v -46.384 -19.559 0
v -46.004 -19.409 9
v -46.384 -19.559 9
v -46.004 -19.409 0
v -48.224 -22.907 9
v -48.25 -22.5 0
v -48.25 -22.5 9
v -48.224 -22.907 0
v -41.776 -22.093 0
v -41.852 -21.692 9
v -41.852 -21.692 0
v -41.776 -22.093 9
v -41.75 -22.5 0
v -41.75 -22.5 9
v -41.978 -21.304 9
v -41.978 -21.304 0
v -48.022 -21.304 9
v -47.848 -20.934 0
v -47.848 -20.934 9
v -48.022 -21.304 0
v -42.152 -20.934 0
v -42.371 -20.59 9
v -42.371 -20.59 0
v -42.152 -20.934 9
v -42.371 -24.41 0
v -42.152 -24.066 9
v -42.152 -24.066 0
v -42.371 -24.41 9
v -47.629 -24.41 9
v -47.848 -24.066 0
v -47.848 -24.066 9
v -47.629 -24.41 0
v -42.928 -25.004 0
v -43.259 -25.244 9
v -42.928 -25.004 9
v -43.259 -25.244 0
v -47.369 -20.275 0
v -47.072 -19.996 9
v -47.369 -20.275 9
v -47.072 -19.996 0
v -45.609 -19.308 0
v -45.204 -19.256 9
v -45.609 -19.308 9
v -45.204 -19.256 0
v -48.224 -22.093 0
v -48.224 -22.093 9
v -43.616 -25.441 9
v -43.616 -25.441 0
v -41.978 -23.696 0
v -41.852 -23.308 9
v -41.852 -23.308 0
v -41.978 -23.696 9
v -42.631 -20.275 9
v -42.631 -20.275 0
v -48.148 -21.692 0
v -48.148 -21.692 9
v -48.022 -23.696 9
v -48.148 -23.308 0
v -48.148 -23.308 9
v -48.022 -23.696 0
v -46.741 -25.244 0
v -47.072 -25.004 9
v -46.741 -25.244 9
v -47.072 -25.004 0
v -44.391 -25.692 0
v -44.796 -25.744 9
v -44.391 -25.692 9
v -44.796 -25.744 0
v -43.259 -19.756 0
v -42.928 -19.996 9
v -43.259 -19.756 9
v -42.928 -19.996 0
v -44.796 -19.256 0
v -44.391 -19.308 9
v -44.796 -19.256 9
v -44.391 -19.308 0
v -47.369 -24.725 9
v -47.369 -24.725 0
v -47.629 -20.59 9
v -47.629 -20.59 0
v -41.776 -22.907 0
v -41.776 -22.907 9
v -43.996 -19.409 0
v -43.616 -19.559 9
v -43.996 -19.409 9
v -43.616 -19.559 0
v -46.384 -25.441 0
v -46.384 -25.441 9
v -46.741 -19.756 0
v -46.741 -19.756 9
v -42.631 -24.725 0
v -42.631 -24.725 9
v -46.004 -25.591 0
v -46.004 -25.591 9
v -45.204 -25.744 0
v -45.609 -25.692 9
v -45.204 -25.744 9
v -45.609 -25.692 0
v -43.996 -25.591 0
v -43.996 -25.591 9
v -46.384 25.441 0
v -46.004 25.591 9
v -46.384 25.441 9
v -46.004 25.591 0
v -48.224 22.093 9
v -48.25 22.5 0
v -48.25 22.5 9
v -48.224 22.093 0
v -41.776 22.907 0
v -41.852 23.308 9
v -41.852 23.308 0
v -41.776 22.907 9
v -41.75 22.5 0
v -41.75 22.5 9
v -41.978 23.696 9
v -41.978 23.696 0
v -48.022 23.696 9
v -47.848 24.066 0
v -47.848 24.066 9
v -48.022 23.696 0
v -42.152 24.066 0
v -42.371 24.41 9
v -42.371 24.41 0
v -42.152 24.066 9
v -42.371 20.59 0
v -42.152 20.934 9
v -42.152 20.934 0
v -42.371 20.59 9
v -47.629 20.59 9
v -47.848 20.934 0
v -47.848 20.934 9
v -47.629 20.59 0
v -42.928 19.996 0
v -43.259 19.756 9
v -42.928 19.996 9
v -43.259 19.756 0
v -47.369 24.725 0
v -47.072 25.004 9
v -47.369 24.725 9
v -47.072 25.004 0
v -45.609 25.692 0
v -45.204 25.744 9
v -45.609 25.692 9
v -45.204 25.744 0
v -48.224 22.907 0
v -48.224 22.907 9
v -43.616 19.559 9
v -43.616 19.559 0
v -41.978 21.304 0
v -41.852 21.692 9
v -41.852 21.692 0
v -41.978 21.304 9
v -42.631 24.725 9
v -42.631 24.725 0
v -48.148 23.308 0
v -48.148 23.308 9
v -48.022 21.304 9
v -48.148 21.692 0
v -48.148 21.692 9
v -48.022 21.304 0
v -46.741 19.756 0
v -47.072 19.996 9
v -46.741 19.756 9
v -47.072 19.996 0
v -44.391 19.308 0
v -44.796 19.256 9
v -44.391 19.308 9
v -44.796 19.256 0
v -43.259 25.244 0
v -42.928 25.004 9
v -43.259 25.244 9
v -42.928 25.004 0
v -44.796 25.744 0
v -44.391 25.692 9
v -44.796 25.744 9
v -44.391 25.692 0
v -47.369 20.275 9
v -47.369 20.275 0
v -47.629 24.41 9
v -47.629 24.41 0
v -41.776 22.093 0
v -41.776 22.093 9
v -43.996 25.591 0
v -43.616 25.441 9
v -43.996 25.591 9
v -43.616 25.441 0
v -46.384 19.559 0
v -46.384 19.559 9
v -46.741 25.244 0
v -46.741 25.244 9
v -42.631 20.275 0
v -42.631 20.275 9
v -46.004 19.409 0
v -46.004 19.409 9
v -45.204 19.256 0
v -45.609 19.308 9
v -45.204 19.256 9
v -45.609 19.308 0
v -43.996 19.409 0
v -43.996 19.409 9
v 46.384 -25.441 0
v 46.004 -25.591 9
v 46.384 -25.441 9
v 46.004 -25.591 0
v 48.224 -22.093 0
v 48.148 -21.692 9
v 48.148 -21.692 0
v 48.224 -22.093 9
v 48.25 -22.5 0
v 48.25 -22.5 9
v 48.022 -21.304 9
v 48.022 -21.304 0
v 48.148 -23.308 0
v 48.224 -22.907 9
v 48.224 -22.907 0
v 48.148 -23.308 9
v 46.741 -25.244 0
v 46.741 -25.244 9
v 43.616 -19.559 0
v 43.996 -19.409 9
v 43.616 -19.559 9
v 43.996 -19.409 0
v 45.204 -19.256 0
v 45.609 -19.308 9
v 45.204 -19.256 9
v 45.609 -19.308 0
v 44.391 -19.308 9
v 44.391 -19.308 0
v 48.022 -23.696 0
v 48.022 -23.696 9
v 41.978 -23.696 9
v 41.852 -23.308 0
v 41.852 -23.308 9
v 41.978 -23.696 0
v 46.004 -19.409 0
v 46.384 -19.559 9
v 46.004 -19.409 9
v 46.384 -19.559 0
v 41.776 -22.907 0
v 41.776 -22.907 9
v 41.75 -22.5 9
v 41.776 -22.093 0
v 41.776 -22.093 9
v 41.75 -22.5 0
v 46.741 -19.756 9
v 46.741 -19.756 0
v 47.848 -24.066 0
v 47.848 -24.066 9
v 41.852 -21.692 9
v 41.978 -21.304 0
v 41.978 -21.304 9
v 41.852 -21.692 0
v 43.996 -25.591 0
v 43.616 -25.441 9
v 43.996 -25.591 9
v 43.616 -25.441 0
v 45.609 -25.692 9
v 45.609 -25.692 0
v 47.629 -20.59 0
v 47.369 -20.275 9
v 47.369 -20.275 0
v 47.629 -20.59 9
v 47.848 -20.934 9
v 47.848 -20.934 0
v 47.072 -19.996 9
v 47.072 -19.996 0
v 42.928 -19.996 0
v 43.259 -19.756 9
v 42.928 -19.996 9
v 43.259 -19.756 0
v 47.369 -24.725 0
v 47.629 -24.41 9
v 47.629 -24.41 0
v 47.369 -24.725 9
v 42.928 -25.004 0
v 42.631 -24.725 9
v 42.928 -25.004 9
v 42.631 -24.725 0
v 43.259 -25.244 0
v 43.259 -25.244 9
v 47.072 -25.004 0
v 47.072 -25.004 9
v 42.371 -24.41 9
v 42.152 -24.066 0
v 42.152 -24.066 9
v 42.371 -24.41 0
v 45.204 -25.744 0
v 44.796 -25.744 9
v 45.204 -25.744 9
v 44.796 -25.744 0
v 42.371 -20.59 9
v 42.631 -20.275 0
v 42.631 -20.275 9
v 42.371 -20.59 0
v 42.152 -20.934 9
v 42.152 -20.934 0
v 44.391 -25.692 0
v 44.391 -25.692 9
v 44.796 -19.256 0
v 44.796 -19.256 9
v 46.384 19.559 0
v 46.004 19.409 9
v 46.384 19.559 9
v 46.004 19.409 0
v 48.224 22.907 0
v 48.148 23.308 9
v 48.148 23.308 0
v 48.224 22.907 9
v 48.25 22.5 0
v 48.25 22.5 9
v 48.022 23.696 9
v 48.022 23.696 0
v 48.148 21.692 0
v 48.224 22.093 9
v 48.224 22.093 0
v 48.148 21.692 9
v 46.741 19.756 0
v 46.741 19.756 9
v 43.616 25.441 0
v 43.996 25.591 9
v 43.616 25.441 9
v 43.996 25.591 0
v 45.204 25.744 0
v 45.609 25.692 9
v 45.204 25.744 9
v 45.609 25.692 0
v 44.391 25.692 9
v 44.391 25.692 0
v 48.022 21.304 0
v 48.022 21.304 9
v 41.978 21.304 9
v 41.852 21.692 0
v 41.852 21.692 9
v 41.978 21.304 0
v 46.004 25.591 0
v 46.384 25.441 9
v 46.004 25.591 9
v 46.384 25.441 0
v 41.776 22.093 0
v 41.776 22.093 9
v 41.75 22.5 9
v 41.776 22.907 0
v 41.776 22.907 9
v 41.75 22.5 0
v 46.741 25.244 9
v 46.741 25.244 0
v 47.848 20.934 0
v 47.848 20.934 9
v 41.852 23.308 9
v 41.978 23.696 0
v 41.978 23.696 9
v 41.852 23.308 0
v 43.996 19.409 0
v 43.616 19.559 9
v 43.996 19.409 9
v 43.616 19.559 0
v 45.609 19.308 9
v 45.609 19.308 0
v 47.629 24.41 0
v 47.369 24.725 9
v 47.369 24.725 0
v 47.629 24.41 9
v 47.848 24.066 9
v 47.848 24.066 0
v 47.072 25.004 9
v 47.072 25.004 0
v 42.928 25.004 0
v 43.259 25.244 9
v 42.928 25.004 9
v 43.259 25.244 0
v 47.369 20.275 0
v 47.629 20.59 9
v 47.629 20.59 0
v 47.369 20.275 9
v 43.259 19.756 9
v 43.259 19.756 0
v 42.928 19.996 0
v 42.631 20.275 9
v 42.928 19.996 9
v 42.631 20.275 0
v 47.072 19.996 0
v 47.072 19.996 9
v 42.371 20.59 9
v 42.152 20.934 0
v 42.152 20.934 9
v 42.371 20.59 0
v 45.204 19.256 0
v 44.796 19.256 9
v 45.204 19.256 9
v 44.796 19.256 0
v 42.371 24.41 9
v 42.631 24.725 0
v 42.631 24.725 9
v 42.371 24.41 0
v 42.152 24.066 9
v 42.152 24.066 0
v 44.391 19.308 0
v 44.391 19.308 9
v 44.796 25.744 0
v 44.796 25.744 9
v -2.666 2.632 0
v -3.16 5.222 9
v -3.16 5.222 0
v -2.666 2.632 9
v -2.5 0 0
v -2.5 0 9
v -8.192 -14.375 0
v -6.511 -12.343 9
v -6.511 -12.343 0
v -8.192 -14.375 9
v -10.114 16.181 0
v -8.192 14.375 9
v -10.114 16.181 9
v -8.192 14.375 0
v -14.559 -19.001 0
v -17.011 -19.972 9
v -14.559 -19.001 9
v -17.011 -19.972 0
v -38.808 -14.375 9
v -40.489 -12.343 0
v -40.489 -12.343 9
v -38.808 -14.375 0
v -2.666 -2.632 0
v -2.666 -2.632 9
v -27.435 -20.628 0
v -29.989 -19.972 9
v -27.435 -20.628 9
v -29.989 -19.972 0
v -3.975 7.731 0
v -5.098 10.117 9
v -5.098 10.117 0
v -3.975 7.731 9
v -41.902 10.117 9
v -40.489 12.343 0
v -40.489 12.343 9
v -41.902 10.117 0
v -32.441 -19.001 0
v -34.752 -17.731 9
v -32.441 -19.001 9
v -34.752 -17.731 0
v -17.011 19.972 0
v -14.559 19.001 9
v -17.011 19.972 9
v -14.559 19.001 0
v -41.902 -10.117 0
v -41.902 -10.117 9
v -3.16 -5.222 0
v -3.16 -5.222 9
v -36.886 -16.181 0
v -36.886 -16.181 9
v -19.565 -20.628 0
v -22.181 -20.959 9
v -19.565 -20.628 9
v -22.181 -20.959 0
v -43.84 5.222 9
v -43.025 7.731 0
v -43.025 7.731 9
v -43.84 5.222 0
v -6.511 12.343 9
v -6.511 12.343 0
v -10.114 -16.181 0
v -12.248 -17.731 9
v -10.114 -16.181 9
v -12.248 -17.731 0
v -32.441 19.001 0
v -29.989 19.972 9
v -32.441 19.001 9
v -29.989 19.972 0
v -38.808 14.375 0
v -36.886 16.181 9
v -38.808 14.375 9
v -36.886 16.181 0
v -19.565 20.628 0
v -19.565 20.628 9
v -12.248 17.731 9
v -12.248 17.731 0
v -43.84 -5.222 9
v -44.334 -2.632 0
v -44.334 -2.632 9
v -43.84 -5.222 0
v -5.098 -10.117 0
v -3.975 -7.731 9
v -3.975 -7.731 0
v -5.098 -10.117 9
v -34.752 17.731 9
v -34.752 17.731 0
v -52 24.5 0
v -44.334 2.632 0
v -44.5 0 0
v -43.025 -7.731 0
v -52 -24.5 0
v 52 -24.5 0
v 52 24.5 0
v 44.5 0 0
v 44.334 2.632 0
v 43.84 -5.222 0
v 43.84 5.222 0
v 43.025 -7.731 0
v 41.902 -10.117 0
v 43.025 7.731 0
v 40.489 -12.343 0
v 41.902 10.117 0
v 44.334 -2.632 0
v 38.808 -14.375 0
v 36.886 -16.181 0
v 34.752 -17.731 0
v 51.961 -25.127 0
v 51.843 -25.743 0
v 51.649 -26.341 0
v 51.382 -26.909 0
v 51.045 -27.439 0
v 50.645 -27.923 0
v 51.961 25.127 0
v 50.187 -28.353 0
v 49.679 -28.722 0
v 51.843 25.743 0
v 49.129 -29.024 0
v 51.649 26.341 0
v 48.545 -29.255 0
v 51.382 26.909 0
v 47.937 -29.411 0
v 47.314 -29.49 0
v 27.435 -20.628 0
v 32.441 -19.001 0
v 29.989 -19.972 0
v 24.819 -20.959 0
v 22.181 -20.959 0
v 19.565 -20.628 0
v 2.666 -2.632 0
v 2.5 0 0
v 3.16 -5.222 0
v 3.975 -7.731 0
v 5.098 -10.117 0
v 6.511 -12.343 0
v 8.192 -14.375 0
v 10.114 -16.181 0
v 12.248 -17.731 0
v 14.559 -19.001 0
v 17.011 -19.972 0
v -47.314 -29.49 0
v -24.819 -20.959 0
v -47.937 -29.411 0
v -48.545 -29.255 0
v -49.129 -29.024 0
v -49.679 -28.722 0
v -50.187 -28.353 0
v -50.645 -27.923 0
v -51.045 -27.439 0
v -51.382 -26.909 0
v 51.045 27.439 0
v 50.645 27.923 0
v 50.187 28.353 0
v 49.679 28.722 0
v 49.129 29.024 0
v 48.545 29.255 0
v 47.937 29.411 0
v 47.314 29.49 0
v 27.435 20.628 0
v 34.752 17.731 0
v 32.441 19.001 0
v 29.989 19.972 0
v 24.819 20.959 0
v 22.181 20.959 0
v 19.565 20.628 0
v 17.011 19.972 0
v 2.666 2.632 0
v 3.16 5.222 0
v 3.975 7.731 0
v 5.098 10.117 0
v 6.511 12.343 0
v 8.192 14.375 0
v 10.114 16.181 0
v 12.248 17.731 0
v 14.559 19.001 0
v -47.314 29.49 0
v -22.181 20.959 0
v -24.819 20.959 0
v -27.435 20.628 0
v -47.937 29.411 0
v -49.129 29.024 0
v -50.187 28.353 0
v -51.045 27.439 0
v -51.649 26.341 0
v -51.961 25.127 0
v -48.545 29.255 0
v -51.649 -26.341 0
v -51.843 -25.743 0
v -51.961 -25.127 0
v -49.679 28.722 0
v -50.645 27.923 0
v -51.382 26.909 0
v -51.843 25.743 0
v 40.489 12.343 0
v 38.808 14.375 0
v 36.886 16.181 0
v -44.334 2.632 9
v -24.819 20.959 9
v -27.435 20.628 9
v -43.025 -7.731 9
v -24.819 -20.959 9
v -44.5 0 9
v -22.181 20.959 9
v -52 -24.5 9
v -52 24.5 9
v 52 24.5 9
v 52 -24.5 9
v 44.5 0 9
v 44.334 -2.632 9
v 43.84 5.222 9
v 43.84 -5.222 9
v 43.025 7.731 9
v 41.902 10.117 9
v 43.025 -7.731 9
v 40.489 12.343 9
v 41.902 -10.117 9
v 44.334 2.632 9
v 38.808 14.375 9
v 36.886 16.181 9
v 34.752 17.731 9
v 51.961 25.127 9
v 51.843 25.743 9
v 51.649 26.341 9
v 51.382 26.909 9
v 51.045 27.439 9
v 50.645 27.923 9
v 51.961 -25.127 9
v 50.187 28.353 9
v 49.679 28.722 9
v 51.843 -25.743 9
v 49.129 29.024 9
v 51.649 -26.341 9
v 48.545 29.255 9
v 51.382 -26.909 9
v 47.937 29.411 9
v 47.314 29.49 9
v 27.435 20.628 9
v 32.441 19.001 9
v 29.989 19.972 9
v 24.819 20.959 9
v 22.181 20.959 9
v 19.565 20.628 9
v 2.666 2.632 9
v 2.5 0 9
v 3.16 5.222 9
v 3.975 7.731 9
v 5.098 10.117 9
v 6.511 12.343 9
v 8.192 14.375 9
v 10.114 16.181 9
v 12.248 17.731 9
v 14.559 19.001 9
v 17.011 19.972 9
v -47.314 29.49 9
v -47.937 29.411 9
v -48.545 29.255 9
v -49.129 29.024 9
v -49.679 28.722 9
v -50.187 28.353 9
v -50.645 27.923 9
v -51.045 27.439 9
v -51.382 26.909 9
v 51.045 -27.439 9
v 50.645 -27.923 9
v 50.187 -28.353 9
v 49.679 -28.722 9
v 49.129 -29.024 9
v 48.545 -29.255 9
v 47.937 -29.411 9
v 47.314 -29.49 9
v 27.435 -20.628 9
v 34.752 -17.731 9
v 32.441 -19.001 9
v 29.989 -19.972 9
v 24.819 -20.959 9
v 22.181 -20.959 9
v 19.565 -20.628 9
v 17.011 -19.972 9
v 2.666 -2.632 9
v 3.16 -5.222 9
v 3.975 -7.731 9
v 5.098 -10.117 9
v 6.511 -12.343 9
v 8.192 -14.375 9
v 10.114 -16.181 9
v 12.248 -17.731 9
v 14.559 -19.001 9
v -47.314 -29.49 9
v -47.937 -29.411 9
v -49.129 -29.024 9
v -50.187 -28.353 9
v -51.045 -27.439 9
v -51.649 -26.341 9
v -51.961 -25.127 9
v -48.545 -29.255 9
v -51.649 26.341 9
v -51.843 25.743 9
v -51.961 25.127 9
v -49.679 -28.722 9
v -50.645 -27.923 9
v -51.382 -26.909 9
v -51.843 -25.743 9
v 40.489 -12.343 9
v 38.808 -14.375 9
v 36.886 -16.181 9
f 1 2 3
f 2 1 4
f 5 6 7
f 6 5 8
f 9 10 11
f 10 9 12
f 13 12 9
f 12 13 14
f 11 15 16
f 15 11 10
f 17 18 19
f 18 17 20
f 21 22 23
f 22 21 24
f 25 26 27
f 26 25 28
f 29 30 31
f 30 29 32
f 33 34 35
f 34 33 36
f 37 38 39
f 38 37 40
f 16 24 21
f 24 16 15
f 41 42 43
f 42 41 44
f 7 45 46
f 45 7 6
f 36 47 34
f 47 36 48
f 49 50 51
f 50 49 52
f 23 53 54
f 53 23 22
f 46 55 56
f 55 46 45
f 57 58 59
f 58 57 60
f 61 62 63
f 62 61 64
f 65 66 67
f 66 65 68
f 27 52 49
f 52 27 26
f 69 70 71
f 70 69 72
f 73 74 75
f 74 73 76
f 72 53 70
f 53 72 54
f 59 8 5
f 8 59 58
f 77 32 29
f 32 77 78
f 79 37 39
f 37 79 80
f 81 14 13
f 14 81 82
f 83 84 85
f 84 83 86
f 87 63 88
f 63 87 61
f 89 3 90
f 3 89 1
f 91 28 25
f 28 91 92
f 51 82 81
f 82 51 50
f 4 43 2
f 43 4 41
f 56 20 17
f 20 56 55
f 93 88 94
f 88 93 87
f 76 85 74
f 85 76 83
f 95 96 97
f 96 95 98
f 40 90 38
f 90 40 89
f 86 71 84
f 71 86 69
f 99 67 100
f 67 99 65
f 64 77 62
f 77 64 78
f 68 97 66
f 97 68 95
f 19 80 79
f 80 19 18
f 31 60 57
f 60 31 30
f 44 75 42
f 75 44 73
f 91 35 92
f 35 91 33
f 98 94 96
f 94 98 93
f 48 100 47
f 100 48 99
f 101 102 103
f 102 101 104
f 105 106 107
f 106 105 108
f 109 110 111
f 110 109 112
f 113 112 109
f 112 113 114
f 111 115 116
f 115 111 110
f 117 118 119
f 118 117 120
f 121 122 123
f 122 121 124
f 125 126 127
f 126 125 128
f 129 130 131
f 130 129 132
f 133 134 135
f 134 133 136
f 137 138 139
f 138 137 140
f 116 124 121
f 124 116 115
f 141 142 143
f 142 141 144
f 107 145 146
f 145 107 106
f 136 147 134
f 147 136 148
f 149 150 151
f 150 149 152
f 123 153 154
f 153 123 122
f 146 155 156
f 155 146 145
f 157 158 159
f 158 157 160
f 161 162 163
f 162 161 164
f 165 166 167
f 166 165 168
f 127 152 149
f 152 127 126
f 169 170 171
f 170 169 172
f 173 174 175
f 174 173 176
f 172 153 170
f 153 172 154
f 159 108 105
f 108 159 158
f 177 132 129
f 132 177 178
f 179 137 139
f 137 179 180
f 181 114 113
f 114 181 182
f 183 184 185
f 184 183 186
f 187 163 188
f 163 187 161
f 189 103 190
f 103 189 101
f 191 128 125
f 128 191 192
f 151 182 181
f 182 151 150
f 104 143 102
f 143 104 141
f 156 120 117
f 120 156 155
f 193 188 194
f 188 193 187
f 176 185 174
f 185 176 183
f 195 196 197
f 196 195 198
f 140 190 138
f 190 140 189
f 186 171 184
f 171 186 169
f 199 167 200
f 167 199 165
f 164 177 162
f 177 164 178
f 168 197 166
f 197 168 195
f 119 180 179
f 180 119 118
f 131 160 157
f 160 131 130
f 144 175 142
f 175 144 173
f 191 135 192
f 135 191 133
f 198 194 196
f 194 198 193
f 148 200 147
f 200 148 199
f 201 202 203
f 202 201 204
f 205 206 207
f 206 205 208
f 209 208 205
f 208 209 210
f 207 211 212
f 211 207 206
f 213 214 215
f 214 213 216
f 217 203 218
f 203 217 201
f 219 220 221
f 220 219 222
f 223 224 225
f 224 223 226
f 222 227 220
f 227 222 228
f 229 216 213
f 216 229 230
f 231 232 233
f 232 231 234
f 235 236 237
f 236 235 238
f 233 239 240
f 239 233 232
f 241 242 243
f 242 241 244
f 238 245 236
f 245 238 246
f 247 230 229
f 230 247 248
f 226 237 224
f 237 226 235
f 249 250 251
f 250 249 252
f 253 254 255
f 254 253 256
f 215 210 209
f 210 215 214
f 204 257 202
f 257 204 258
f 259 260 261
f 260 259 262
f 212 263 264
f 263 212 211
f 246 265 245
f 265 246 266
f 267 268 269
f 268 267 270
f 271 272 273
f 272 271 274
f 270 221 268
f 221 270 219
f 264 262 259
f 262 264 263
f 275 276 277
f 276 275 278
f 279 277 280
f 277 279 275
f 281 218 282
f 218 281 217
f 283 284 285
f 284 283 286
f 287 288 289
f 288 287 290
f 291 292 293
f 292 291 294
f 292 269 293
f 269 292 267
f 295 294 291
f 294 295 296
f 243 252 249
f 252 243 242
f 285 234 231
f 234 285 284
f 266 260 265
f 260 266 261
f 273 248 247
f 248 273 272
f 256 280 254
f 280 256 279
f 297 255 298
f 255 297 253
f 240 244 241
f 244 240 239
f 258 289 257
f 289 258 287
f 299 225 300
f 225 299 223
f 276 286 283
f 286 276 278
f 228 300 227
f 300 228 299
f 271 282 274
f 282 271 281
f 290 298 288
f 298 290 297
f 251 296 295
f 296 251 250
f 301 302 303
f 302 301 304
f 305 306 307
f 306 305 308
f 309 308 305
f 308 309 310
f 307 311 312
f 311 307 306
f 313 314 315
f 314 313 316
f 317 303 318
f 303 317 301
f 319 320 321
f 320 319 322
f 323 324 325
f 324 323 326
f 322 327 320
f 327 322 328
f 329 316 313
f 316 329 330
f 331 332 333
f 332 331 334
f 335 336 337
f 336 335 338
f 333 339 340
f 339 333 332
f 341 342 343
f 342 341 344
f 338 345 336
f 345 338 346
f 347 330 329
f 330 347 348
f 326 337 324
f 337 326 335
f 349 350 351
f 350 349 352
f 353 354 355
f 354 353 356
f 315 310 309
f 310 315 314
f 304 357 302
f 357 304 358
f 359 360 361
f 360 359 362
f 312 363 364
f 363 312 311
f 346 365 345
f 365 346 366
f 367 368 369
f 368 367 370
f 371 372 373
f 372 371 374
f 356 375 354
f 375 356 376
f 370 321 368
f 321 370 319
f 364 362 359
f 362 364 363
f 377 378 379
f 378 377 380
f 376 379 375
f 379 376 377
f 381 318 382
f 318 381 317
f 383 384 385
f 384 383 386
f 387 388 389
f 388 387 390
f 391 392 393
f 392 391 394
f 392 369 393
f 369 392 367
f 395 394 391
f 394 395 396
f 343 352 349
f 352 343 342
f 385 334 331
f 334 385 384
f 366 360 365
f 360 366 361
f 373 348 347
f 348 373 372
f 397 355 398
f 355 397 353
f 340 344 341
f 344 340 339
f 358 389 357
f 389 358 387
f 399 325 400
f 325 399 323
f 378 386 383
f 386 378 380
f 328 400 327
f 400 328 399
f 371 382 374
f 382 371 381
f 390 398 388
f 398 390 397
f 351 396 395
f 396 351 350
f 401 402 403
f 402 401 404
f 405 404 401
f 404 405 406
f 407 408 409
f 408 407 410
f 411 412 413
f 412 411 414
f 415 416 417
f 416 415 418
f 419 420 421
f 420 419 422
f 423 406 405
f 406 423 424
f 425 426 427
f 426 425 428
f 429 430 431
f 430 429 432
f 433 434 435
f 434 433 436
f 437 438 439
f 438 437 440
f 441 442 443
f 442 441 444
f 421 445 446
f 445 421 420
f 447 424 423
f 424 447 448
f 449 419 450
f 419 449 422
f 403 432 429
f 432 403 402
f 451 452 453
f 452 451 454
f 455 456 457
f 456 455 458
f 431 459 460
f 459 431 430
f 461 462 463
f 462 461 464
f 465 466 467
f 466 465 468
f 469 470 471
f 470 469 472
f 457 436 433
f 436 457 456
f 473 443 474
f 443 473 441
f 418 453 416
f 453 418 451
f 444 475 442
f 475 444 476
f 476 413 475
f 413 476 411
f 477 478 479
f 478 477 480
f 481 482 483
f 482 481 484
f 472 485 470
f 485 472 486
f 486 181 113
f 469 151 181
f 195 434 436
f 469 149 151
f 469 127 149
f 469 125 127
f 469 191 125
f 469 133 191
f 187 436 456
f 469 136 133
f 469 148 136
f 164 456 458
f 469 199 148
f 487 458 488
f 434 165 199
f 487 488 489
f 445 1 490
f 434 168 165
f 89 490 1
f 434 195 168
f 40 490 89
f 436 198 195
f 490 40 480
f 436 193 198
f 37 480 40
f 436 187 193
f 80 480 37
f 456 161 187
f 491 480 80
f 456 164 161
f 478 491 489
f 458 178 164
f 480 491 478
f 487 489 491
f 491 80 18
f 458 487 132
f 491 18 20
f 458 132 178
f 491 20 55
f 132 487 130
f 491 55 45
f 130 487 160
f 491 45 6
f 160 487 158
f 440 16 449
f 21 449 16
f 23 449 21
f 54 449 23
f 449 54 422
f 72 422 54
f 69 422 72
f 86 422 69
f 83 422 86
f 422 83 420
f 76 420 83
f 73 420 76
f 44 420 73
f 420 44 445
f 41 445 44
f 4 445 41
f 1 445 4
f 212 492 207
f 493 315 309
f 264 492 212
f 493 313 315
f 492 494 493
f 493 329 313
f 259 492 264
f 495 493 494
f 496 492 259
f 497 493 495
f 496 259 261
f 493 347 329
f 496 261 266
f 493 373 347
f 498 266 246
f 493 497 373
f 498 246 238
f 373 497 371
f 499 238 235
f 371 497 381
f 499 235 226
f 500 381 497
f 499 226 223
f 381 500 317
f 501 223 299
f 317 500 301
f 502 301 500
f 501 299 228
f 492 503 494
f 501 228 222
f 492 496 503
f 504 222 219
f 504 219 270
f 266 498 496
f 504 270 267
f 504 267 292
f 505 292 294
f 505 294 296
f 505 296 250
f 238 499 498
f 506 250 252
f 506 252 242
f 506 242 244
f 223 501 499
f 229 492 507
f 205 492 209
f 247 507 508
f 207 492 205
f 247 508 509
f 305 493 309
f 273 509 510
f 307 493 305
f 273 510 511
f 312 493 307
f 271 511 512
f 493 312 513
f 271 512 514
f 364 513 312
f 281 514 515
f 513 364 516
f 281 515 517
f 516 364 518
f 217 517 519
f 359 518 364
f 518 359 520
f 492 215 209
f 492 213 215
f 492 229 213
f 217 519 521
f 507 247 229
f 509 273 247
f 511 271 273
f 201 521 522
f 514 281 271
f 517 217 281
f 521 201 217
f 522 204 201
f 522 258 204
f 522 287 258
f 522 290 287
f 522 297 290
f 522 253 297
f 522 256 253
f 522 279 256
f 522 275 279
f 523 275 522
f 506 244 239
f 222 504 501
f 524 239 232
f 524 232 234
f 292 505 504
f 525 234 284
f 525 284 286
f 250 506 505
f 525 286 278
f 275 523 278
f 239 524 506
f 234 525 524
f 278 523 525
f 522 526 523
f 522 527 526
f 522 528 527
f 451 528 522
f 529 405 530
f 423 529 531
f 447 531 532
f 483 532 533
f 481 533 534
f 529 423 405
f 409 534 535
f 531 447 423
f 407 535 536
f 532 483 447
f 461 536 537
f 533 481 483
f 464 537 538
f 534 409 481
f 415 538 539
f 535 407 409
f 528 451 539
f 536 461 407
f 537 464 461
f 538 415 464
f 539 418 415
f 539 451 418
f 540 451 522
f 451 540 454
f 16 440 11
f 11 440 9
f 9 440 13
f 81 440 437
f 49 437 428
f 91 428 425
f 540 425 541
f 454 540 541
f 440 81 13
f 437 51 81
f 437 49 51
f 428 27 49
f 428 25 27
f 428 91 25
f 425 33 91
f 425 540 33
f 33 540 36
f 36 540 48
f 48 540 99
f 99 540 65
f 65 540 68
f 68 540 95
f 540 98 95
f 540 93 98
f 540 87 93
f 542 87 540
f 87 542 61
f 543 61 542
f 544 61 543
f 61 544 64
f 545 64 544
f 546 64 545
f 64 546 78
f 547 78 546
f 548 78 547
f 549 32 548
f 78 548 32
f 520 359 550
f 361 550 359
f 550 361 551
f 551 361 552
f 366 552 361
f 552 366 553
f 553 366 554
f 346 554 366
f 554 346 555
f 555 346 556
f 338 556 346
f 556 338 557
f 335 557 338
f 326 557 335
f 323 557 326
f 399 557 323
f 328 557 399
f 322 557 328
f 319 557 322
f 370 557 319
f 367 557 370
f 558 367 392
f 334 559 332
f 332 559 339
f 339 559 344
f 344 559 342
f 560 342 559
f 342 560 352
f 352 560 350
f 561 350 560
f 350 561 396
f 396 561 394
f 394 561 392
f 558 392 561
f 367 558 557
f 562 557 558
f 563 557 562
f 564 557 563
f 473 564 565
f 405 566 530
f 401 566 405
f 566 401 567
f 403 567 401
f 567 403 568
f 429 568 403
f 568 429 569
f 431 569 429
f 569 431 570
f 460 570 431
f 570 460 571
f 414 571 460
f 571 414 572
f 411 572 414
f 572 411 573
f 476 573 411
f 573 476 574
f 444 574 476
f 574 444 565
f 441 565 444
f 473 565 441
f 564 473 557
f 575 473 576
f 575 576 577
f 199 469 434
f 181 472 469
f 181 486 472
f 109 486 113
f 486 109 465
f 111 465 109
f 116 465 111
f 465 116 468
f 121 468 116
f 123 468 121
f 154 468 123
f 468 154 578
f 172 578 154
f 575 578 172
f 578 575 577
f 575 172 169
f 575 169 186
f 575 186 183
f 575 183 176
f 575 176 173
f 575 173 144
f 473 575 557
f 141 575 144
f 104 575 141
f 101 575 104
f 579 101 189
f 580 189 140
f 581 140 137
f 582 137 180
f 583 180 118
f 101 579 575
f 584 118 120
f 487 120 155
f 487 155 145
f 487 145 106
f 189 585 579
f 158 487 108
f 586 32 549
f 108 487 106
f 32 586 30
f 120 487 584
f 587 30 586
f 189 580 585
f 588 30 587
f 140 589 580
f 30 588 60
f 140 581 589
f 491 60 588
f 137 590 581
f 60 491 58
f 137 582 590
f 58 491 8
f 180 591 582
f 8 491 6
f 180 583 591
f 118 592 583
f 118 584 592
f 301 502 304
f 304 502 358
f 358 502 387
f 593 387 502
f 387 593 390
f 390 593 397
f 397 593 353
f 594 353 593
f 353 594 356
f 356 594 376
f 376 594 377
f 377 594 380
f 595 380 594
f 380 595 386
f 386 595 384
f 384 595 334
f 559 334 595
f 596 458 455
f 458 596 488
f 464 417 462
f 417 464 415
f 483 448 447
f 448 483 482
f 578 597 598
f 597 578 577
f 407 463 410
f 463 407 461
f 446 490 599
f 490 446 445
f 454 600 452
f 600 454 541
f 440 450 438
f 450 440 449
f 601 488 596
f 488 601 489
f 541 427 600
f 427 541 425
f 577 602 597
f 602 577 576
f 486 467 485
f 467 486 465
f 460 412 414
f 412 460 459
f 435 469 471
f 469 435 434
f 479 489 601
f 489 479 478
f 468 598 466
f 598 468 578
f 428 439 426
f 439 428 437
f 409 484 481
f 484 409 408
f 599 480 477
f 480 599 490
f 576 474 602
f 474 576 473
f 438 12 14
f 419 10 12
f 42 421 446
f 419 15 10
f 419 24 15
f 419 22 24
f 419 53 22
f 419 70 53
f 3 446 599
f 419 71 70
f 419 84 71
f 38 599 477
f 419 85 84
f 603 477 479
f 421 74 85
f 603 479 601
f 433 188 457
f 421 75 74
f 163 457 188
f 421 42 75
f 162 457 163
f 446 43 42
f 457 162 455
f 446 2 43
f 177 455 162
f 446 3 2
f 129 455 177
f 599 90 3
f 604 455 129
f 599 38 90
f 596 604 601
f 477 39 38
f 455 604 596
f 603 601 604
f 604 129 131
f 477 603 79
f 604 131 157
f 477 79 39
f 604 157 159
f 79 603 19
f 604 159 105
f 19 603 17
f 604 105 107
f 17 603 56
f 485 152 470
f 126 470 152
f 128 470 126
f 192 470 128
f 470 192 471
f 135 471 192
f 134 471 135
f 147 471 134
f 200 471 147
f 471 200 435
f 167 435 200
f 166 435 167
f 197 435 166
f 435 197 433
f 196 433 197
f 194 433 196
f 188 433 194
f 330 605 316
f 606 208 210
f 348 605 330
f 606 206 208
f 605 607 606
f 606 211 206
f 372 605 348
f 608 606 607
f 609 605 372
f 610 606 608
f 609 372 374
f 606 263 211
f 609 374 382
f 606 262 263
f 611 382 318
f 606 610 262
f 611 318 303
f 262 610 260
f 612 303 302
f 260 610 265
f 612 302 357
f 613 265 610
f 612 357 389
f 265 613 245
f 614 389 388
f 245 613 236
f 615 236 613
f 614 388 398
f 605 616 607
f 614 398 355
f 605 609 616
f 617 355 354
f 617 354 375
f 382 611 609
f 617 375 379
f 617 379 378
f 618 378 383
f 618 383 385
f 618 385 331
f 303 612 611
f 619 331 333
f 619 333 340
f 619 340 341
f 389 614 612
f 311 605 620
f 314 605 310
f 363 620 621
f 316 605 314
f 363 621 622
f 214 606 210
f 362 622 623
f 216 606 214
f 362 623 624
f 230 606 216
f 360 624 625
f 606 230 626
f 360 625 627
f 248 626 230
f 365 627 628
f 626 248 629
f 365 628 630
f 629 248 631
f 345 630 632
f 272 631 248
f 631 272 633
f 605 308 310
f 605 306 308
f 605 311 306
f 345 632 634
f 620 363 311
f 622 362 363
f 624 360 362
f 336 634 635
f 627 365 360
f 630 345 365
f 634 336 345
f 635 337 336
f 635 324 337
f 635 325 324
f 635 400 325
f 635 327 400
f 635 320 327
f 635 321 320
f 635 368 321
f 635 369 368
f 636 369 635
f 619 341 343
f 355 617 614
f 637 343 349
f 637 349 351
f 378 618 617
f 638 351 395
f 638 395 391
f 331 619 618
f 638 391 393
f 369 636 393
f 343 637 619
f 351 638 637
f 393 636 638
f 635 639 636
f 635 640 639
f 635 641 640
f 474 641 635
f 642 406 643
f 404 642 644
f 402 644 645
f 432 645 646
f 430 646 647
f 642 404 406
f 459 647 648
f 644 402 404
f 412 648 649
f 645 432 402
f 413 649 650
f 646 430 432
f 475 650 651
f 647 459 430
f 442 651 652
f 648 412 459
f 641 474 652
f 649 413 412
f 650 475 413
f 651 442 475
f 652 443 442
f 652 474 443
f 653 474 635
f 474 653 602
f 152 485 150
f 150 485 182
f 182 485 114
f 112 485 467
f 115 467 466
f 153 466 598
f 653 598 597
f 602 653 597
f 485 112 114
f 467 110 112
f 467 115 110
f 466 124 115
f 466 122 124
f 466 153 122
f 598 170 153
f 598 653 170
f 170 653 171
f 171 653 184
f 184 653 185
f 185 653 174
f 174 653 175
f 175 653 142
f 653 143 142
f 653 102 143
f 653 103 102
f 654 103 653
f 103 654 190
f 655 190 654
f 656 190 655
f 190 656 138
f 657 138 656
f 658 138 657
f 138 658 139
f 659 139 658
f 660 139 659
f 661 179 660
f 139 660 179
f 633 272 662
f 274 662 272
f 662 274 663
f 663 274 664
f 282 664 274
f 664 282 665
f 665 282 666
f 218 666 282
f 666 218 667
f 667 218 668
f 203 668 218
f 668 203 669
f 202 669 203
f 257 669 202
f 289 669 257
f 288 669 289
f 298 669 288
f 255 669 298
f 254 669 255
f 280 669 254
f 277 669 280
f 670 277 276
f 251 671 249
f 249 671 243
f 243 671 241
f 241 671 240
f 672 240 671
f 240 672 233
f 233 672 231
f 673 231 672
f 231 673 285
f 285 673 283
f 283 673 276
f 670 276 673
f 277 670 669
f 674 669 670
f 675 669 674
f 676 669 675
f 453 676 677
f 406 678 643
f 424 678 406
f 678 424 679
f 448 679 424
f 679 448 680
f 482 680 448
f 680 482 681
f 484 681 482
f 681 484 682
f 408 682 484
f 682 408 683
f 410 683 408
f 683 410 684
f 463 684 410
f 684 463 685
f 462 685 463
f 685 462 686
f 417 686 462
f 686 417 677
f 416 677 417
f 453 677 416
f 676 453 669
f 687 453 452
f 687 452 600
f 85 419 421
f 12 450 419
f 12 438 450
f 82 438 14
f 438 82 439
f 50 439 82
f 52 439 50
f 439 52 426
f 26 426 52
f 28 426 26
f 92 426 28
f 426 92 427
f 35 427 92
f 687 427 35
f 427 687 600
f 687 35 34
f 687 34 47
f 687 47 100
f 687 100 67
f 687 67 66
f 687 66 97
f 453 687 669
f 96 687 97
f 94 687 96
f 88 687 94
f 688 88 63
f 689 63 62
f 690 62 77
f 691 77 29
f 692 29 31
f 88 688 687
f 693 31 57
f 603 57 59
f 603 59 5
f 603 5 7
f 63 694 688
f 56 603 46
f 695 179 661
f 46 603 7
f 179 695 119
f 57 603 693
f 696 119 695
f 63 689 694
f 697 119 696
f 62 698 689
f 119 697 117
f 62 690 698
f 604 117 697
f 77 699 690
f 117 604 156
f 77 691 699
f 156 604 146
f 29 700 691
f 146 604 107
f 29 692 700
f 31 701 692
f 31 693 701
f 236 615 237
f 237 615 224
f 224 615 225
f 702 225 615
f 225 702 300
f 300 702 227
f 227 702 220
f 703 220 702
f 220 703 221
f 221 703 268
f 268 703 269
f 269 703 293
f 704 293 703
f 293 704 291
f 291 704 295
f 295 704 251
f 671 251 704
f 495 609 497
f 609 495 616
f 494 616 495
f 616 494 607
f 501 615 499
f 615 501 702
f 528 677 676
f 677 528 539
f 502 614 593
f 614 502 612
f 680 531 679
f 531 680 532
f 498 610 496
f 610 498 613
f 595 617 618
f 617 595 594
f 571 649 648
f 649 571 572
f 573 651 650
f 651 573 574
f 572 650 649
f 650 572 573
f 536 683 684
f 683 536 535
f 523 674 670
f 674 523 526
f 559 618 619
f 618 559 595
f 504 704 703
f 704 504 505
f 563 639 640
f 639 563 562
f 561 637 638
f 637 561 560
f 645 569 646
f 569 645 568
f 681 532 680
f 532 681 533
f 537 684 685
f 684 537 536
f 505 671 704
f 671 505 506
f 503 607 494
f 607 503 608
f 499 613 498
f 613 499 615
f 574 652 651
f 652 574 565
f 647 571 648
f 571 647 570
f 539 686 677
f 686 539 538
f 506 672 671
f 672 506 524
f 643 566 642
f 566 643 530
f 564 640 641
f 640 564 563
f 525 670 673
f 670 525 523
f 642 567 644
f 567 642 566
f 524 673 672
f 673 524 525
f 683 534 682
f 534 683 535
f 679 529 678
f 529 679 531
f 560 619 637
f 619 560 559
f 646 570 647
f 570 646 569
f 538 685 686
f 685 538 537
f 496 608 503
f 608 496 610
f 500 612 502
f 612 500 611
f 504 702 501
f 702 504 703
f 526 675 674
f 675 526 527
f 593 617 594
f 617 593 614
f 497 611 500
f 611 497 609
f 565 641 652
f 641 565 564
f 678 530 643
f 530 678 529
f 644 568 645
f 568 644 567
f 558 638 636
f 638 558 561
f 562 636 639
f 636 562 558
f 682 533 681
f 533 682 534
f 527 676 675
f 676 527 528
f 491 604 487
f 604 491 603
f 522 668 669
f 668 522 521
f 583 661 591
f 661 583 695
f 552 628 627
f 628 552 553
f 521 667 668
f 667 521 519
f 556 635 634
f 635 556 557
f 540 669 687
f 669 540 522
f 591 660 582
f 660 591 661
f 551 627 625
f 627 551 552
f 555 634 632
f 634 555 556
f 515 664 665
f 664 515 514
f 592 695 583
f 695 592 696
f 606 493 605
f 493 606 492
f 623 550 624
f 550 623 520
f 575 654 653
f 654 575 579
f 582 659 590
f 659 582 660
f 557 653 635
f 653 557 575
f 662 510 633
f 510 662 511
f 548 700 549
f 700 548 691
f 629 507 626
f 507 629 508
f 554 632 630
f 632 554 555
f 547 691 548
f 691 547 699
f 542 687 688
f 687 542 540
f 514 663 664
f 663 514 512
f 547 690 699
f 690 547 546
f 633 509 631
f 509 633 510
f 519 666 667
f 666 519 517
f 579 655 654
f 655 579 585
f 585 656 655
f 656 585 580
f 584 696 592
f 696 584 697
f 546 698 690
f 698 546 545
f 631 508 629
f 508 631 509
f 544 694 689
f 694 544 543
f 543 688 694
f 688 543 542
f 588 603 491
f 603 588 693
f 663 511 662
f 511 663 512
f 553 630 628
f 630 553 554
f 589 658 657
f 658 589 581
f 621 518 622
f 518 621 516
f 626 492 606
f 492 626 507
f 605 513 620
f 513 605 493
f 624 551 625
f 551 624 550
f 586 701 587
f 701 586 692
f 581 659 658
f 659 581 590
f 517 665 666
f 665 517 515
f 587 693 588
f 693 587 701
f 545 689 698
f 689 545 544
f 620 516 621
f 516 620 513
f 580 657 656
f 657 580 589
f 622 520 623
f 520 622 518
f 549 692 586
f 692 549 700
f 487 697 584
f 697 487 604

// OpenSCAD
$fn = 50;


difference() {
	union() {
		hull() {
			translate(v = [-47.0000000000, 24.5000000000, 0]) {
				cylinder(h = 9, r = 5);
			}
			translate(v = [47.0000000000, 24.5000000000, 0]) {
				cylinder(h = 9, r = 5);
			}
			translate(v = [-47.0000000000, -24.5000000000, 0]) {
				cylinder(h = 9, r = 5);
			}
			translate(v = [47.0000000000, -24.5000000000, 0]) {
				cylinder(h = 9, r = 5);
			}
		}
	}
	union() {
		#translate(v = [-45.0000000000, -22.5000000000, -100.0000000000]) {
			cylinder(h = 200, r = 3.2500000000);
		}
		#translate(v = [-45.0000000000, 22.5000000000, -100.0000000000]) {
			cylinder(h = 200, r = 3.2500000000);
		}
		#translate(v = [45.0000000000, -22.5000000000, -100.0000000000]) {
			cylinder(h = 200, r = 3.2500000000);
		}
		#translate(v = [45.0000000000, 22.5000000000, -100.0000000000]) {
			cylinder(h = 200, r = 3.2500000000);
		}
		#translate(v = [-23.5000000000, 0, 0]) {
			cylinder(h = 9, r = 21.0000000000);
		}
		#translate(v = [23.5000000000, 0, 0]) {
			cylinder(h = 9, r = 21.0000000000);
		}
	}
}
